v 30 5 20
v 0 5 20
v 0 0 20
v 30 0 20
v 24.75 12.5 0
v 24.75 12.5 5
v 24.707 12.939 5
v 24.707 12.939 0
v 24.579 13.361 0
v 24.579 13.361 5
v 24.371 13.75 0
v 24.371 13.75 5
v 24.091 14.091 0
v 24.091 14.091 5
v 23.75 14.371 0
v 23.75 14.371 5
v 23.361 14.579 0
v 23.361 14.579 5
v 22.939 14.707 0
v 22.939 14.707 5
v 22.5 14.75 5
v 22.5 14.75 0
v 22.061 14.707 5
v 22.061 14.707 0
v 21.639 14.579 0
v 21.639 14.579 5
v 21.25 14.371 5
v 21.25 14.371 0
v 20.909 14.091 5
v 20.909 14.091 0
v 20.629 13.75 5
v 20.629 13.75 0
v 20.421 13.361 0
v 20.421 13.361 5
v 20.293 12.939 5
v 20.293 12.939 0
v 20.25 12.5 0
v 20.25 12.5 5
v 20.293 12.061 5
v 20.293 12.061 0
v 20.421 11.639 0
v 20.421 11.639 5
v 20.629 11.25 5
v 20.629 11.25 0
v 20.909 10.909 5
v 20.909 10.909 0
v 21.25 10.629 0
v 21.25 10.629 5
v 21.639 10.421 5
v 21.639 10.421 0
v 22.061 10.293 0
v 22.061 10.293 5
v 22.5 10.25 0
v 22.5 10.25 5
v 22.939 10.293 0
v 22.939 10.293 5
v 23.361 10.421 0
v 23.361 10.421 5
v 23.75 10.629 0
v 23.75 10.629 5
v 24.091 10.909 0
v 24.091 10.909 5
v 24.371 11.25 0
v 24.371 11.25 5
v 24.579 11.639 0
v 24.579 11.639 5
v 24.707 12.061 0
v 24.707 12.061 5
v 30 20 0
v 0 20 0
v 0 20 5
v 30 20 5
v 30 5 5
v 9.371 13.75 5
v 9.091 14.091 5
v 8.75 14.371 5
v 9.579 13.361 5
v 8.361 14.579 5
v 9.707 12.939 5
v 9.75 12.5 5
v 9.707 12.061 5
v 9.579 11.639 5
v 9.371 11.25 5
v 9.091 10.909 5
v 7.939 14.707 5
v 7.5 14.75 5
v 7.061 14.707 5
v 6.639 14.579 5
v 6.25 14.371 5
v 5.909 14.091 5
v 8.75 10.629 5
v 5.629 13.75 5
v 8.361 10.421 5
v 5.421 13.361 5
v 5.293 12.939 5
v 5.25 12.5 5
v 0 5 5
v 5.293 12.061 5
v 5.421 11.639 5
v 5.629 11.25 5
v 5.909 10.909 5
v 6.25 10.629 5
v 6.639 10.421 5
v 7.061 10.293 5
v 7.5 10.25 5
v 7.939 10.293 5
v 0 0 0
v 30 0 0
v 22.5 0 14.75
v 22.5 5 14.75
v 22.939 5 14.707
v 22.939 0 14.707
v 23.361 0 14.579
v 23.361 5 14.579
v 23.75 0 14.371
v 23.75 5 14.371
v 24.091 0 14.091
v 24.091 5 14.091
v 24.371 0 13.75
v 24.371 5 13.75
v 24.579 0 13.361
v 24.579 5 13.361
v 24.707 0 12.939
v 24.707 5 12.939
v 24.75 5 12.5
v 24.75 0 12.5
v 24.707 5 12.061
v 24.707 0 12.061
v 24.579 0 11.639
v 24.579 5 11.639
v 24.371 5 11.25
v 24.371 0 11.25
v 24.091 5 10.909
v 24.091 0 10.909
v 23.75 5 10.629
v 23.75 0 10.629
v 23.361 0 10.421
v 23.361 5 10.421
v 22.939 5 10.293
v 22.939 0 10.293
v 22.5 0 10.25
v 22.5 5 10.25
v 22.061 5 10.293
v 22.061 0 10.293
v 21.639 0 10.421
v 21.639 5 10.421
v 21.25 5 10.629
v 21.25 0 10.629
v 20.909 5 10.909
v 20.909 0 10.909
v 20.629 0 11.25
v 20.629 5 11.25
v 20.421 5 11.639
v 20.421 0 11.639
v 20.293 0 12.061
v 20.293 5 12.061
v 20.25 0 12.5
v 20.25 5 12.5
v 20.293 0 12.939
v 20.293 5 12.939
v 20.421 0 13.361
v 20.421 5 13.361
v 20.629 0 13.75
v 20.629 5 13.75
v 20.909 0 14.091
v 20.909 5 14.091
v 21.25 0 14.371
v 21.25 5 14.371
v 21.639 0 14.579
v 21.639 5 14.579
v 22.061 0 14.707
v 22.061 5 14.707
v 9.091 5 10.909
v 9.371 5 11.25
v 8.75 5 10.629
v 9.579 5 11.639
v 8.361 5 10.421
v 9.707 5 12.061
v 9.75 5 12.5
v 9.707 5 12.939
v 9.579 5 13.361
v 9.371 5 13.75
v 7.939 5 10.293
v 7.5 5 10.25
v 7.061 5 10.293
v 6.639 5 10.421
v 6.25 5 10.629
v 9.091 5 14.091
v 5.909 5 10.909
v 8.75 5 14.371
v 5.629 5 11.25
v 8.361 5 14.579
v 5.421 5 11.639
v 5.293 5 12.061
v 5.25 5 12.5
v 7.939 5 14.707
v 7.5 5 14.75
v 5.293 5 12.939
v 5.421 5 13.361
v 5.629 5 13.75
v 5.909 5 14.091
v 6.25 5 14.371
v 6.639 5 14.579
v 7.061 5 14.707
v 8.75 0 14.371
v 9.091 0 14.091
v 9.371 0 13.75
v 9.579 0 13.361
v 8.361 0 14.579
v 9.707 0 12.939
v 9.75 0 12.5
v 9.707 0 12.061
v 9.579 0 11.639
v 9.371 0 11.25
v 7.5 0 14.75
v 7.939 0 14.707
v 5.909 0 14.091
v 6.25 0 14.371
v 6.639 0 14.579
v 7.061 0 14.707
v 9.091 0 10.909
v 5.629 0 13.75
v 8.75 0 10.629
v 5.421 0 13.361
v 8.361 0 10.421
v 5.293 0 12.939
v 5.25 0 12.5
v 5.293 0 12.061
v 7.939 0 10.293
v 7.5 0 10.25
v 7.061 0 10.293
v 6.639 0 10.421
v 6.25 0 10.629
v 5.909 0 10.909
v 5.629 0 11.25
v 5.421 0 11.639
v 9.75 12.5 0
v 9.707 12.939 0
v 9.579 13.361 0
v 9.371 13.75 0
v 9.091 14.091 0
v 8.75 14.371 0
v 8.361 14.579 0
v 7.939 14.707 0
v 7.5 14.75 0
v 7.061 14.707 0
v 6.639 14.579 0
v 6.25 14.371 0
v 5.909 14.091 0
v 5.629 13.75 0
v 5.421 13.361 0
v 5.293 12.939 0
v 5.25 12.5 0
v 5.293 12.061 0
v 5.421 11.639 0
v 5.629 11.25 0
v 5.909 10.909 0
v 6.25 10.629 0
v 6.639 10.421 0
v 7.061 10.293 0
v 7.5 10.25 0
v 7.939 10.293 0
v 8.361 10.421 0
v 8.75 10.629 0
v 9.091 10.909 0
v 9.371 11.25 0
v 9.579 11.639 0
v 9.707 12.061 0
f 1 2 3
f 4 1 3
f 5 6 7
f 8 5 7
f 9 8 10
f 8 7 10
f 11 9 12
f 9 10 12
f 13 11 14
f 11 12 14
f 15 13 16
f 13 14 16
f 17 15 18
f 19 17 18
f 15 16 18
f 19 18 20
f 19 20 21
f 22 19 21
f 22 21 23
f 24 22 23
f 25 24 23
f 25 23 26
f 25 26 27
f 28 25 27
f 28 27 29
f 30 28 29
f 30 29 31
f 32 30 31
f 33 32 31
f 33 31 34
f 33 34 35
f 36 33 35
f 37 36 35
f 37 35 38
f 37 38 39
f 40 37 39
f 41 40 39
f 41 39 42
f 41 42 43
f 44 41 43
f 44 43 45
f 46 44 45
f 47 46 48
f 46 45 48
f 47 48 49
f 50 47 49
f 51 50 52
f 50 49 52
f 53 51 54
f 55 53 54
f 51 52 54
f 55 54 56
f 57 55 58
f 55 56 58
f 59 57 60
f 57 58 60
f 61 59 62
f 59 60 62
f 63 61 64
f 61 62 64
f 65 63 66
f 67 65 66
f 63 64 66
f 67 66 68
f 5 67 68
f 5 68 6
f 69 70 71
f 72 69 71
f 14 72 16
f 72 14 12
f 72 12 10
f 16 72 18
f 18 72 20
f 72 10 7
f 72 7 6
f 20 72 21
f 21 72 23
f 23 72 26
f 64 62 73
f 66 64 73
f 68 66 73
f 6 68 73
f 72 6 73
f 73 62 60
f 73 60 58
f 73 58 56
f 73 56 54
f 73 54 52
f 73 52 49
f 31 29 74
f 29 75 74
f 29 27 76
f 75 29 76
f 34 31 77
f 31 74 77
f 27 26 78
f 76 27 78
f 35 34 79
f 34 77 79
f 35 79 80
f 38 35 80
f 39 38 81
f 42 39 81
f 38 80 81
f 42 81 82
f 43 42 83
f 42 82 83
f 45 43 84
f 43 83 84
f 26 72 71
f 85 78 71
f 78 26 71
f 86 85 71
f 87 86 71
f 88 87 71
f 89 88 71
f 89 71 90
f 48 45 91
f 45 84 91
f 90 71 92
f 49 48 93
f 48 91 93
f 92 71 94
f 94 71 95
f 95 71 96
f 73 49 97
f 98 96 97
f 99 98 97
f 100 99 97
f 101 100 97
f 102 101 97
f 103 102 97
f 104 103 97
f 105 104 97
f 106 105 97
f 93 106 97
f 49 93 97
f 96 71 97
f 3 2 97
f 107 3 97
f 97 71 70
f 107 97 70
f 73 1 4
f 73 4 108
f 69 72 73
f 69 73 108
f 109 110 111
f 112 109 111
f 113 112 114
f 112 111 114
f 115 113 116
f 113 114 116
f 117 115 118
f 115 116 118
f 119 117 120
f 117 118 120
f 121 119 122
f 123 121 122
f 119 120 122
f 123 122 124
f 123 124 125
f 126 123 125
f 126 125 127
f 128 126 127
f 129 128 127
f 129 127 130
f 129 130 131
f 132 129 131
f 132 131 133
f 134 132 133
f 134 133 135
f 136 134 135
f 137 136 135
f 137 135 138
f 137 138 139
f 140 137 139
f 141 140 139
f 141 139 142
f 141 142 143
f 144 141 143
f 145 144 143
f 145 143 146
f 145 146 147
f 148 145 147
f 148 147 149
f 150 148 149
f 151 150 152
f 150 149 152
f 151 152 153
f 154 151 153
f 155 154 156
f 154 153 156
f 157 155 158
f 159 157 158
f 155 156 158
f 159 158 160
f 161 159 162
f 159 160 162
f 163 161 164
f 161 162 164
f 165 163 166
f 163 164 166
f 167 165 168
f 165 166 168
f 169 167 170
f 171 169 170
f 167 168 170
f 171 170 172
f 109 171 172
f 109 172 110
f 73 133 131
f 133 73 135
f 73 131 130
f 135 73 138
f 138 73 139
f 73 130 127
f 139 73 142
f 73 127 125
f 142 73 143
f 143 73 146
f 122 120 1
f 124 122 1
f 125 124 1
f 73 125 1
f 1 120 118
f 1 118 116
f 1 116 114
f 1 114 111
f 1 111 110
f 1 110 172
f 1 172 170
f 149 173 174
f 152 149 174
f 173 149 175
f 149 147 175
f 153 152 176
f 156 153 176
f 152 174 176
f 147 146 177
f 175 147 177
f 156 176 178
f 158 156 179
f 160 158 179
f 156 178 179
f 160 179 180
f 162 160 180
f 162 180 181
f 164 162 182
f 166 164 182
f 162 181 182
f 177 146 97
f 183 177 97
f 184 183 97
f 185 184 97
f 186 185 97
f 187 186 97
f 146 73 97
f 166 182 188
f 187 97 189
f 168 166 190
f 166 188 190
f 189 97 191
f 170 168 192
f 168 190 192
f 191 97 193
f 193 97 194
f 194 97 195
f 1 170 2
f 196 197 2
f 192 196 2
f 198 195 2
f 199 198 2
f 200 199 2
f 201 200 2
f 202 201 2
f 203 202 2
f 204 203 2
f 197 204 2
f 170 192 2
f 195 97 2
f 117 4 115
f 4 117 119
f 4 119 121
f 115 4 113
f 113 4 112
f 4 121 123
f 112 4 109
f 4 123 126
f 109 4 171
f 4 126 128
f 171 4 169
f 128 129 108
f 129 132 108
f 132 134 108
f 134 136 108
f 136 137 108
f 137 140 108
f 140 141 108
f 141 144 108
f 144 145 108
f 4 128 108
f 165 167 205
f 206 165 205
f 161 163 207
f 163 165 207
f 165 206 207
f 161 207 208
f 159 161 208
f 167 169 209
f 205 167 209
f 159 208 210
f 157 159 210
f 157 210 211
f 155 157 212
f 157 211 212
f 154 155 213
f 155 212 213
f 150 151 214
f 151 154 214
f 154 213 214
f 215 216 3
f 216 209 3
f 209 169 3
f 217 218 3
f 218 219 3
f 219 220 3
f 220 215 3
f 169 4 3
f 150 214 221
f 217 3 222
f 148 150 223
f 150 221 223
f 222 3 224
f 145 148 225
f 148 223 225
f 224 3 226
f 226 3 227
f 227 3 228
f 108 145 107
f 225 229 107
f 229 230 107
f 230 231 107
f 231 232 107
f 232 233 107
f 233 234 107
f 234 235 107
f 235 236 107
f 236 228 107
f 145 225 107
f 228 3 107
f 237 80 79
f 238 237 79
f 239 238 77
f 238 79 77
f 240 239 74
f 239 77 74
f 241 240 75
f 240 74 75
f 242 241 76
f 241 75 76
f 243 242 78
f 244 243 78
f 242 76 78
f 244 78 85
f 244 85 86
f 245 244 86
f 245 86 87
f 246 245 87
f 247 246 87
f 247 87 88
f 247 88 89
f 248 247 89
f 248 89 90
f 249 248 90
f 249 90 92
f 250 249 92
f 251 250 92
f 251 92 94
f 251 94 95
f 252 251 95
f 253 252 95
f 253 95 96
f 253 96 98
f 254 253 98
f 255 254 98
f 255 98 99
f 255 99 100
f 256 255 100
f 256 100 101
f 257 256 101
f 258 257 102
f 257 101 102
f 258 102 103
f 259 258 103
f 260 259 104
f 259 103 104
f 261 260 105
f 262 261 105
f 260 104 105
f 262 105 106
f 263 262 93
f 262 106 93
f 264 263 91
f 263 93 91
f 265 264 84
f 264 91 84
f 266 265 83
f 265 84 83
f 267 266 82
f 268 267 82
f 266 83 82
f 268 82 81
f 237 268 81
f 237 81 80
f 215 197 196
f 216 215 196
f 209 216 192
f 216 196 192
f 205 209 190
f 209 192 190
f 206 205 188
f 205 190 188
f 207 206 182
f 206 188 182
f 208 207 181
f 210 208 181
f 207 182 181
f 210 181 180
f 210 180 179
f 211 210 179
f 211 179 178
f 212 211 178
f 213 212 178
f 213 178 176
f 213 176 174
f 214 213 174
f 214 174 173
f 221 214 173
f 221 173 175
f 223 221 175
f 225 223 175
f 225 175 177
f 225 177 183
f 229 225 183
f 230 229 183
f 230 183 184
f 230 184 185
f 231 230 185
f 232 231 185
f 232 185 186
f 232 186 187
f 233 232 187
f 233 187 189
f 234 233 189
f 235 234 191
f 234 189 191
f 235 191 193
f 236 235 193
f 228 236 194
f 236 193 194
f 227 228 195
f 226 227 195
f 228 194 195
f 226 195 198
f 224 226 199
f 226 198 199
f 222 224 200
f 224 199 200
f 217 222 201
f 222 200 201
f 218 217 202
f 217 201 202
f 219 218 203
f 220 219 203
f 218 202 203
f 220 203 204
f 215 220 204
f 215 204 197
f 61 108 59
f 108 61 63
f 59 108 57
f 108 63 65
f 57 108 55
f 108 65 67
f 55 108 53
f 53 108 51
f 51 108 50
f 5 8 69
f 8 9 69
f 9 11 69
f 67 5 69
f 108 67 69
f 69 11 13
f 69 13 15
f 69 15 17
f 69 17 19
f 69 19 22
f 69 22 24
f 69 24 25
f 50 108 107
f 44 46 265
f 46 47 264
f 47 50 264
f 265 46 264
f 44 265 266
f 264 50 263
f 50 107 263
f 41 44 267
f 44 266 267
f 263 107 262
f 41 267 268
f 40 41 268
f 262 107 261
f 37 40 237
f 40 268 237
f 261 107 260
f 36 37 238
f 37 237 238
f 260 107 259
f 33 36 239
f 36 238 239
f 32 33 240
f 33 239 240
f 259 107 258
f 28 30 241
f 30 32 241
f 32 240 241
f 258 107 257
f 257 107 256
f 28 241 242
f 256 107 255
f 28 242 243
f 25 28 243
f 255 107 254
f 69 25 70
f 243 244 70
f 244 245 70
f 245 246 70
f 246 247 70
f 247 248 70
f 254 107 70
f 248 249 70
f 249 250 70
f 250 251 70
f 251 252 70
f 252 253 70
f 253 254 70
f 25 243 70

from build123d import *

# Parameters (mm, degrees)
BOSS_EXTRUDE1_DEPTH = 30
SKETCH2_R           = 2.25
CUT_EXTRUDE1_DEPTH  = 40.05124838
SKETCH3_R           = 2.25
CUT_EXTRUDE2_DEPTH  = 40.05124838


with BuildPart() as part:
    # Sketch1 → Boss-Extrude1 (new body)
    with BuildSketch(Plane(origin=(0, 0, 0), x_dir=(0, 0, -1), z_dir=(1, 0, 0))):
        Polygon((0, 0), (0, 20), (-5, 20), (-5, 5), (-20, 5), (-20, 0), align=None)
    extrude(amount=BOSS_EXTRUDE1_DEPTH)

    # Sketch2 → Cut-Extrude1 (cut, through all)
    with BuildSketch(Plane.XY.offset(5)):
        with Locations((7.5, 12.5)):
            Circle(SKETCH2_R)
        with Locations((22.5, 12.5)):
            Circle(SKETCH2_R)
    extrude(amount=-CUT_EXTRUDE1_DEPTH, mode=Mode.SUBTRACT)

    # Sketch3 → Cut-Extrude2 (cut, through all)
    with BuildSketch(Plane(origin=(0, 5, 0), x_dir=(1, 0, 0), z_dir=(0, 1, 0))):
        with Locations(Location((7.5, -12.5, 0), (0, 0, 270))):
            Circle(SKETCH3_R)
        with Locations(Location((22.5, -12.5, 0), (0, 0, 270))):
            Circle(SKETCH3_R)
    extrude(amount=-CUT_EXTRUDE2_DEPTH, mode=Mode.SUBTRACT)


solid = part.part
